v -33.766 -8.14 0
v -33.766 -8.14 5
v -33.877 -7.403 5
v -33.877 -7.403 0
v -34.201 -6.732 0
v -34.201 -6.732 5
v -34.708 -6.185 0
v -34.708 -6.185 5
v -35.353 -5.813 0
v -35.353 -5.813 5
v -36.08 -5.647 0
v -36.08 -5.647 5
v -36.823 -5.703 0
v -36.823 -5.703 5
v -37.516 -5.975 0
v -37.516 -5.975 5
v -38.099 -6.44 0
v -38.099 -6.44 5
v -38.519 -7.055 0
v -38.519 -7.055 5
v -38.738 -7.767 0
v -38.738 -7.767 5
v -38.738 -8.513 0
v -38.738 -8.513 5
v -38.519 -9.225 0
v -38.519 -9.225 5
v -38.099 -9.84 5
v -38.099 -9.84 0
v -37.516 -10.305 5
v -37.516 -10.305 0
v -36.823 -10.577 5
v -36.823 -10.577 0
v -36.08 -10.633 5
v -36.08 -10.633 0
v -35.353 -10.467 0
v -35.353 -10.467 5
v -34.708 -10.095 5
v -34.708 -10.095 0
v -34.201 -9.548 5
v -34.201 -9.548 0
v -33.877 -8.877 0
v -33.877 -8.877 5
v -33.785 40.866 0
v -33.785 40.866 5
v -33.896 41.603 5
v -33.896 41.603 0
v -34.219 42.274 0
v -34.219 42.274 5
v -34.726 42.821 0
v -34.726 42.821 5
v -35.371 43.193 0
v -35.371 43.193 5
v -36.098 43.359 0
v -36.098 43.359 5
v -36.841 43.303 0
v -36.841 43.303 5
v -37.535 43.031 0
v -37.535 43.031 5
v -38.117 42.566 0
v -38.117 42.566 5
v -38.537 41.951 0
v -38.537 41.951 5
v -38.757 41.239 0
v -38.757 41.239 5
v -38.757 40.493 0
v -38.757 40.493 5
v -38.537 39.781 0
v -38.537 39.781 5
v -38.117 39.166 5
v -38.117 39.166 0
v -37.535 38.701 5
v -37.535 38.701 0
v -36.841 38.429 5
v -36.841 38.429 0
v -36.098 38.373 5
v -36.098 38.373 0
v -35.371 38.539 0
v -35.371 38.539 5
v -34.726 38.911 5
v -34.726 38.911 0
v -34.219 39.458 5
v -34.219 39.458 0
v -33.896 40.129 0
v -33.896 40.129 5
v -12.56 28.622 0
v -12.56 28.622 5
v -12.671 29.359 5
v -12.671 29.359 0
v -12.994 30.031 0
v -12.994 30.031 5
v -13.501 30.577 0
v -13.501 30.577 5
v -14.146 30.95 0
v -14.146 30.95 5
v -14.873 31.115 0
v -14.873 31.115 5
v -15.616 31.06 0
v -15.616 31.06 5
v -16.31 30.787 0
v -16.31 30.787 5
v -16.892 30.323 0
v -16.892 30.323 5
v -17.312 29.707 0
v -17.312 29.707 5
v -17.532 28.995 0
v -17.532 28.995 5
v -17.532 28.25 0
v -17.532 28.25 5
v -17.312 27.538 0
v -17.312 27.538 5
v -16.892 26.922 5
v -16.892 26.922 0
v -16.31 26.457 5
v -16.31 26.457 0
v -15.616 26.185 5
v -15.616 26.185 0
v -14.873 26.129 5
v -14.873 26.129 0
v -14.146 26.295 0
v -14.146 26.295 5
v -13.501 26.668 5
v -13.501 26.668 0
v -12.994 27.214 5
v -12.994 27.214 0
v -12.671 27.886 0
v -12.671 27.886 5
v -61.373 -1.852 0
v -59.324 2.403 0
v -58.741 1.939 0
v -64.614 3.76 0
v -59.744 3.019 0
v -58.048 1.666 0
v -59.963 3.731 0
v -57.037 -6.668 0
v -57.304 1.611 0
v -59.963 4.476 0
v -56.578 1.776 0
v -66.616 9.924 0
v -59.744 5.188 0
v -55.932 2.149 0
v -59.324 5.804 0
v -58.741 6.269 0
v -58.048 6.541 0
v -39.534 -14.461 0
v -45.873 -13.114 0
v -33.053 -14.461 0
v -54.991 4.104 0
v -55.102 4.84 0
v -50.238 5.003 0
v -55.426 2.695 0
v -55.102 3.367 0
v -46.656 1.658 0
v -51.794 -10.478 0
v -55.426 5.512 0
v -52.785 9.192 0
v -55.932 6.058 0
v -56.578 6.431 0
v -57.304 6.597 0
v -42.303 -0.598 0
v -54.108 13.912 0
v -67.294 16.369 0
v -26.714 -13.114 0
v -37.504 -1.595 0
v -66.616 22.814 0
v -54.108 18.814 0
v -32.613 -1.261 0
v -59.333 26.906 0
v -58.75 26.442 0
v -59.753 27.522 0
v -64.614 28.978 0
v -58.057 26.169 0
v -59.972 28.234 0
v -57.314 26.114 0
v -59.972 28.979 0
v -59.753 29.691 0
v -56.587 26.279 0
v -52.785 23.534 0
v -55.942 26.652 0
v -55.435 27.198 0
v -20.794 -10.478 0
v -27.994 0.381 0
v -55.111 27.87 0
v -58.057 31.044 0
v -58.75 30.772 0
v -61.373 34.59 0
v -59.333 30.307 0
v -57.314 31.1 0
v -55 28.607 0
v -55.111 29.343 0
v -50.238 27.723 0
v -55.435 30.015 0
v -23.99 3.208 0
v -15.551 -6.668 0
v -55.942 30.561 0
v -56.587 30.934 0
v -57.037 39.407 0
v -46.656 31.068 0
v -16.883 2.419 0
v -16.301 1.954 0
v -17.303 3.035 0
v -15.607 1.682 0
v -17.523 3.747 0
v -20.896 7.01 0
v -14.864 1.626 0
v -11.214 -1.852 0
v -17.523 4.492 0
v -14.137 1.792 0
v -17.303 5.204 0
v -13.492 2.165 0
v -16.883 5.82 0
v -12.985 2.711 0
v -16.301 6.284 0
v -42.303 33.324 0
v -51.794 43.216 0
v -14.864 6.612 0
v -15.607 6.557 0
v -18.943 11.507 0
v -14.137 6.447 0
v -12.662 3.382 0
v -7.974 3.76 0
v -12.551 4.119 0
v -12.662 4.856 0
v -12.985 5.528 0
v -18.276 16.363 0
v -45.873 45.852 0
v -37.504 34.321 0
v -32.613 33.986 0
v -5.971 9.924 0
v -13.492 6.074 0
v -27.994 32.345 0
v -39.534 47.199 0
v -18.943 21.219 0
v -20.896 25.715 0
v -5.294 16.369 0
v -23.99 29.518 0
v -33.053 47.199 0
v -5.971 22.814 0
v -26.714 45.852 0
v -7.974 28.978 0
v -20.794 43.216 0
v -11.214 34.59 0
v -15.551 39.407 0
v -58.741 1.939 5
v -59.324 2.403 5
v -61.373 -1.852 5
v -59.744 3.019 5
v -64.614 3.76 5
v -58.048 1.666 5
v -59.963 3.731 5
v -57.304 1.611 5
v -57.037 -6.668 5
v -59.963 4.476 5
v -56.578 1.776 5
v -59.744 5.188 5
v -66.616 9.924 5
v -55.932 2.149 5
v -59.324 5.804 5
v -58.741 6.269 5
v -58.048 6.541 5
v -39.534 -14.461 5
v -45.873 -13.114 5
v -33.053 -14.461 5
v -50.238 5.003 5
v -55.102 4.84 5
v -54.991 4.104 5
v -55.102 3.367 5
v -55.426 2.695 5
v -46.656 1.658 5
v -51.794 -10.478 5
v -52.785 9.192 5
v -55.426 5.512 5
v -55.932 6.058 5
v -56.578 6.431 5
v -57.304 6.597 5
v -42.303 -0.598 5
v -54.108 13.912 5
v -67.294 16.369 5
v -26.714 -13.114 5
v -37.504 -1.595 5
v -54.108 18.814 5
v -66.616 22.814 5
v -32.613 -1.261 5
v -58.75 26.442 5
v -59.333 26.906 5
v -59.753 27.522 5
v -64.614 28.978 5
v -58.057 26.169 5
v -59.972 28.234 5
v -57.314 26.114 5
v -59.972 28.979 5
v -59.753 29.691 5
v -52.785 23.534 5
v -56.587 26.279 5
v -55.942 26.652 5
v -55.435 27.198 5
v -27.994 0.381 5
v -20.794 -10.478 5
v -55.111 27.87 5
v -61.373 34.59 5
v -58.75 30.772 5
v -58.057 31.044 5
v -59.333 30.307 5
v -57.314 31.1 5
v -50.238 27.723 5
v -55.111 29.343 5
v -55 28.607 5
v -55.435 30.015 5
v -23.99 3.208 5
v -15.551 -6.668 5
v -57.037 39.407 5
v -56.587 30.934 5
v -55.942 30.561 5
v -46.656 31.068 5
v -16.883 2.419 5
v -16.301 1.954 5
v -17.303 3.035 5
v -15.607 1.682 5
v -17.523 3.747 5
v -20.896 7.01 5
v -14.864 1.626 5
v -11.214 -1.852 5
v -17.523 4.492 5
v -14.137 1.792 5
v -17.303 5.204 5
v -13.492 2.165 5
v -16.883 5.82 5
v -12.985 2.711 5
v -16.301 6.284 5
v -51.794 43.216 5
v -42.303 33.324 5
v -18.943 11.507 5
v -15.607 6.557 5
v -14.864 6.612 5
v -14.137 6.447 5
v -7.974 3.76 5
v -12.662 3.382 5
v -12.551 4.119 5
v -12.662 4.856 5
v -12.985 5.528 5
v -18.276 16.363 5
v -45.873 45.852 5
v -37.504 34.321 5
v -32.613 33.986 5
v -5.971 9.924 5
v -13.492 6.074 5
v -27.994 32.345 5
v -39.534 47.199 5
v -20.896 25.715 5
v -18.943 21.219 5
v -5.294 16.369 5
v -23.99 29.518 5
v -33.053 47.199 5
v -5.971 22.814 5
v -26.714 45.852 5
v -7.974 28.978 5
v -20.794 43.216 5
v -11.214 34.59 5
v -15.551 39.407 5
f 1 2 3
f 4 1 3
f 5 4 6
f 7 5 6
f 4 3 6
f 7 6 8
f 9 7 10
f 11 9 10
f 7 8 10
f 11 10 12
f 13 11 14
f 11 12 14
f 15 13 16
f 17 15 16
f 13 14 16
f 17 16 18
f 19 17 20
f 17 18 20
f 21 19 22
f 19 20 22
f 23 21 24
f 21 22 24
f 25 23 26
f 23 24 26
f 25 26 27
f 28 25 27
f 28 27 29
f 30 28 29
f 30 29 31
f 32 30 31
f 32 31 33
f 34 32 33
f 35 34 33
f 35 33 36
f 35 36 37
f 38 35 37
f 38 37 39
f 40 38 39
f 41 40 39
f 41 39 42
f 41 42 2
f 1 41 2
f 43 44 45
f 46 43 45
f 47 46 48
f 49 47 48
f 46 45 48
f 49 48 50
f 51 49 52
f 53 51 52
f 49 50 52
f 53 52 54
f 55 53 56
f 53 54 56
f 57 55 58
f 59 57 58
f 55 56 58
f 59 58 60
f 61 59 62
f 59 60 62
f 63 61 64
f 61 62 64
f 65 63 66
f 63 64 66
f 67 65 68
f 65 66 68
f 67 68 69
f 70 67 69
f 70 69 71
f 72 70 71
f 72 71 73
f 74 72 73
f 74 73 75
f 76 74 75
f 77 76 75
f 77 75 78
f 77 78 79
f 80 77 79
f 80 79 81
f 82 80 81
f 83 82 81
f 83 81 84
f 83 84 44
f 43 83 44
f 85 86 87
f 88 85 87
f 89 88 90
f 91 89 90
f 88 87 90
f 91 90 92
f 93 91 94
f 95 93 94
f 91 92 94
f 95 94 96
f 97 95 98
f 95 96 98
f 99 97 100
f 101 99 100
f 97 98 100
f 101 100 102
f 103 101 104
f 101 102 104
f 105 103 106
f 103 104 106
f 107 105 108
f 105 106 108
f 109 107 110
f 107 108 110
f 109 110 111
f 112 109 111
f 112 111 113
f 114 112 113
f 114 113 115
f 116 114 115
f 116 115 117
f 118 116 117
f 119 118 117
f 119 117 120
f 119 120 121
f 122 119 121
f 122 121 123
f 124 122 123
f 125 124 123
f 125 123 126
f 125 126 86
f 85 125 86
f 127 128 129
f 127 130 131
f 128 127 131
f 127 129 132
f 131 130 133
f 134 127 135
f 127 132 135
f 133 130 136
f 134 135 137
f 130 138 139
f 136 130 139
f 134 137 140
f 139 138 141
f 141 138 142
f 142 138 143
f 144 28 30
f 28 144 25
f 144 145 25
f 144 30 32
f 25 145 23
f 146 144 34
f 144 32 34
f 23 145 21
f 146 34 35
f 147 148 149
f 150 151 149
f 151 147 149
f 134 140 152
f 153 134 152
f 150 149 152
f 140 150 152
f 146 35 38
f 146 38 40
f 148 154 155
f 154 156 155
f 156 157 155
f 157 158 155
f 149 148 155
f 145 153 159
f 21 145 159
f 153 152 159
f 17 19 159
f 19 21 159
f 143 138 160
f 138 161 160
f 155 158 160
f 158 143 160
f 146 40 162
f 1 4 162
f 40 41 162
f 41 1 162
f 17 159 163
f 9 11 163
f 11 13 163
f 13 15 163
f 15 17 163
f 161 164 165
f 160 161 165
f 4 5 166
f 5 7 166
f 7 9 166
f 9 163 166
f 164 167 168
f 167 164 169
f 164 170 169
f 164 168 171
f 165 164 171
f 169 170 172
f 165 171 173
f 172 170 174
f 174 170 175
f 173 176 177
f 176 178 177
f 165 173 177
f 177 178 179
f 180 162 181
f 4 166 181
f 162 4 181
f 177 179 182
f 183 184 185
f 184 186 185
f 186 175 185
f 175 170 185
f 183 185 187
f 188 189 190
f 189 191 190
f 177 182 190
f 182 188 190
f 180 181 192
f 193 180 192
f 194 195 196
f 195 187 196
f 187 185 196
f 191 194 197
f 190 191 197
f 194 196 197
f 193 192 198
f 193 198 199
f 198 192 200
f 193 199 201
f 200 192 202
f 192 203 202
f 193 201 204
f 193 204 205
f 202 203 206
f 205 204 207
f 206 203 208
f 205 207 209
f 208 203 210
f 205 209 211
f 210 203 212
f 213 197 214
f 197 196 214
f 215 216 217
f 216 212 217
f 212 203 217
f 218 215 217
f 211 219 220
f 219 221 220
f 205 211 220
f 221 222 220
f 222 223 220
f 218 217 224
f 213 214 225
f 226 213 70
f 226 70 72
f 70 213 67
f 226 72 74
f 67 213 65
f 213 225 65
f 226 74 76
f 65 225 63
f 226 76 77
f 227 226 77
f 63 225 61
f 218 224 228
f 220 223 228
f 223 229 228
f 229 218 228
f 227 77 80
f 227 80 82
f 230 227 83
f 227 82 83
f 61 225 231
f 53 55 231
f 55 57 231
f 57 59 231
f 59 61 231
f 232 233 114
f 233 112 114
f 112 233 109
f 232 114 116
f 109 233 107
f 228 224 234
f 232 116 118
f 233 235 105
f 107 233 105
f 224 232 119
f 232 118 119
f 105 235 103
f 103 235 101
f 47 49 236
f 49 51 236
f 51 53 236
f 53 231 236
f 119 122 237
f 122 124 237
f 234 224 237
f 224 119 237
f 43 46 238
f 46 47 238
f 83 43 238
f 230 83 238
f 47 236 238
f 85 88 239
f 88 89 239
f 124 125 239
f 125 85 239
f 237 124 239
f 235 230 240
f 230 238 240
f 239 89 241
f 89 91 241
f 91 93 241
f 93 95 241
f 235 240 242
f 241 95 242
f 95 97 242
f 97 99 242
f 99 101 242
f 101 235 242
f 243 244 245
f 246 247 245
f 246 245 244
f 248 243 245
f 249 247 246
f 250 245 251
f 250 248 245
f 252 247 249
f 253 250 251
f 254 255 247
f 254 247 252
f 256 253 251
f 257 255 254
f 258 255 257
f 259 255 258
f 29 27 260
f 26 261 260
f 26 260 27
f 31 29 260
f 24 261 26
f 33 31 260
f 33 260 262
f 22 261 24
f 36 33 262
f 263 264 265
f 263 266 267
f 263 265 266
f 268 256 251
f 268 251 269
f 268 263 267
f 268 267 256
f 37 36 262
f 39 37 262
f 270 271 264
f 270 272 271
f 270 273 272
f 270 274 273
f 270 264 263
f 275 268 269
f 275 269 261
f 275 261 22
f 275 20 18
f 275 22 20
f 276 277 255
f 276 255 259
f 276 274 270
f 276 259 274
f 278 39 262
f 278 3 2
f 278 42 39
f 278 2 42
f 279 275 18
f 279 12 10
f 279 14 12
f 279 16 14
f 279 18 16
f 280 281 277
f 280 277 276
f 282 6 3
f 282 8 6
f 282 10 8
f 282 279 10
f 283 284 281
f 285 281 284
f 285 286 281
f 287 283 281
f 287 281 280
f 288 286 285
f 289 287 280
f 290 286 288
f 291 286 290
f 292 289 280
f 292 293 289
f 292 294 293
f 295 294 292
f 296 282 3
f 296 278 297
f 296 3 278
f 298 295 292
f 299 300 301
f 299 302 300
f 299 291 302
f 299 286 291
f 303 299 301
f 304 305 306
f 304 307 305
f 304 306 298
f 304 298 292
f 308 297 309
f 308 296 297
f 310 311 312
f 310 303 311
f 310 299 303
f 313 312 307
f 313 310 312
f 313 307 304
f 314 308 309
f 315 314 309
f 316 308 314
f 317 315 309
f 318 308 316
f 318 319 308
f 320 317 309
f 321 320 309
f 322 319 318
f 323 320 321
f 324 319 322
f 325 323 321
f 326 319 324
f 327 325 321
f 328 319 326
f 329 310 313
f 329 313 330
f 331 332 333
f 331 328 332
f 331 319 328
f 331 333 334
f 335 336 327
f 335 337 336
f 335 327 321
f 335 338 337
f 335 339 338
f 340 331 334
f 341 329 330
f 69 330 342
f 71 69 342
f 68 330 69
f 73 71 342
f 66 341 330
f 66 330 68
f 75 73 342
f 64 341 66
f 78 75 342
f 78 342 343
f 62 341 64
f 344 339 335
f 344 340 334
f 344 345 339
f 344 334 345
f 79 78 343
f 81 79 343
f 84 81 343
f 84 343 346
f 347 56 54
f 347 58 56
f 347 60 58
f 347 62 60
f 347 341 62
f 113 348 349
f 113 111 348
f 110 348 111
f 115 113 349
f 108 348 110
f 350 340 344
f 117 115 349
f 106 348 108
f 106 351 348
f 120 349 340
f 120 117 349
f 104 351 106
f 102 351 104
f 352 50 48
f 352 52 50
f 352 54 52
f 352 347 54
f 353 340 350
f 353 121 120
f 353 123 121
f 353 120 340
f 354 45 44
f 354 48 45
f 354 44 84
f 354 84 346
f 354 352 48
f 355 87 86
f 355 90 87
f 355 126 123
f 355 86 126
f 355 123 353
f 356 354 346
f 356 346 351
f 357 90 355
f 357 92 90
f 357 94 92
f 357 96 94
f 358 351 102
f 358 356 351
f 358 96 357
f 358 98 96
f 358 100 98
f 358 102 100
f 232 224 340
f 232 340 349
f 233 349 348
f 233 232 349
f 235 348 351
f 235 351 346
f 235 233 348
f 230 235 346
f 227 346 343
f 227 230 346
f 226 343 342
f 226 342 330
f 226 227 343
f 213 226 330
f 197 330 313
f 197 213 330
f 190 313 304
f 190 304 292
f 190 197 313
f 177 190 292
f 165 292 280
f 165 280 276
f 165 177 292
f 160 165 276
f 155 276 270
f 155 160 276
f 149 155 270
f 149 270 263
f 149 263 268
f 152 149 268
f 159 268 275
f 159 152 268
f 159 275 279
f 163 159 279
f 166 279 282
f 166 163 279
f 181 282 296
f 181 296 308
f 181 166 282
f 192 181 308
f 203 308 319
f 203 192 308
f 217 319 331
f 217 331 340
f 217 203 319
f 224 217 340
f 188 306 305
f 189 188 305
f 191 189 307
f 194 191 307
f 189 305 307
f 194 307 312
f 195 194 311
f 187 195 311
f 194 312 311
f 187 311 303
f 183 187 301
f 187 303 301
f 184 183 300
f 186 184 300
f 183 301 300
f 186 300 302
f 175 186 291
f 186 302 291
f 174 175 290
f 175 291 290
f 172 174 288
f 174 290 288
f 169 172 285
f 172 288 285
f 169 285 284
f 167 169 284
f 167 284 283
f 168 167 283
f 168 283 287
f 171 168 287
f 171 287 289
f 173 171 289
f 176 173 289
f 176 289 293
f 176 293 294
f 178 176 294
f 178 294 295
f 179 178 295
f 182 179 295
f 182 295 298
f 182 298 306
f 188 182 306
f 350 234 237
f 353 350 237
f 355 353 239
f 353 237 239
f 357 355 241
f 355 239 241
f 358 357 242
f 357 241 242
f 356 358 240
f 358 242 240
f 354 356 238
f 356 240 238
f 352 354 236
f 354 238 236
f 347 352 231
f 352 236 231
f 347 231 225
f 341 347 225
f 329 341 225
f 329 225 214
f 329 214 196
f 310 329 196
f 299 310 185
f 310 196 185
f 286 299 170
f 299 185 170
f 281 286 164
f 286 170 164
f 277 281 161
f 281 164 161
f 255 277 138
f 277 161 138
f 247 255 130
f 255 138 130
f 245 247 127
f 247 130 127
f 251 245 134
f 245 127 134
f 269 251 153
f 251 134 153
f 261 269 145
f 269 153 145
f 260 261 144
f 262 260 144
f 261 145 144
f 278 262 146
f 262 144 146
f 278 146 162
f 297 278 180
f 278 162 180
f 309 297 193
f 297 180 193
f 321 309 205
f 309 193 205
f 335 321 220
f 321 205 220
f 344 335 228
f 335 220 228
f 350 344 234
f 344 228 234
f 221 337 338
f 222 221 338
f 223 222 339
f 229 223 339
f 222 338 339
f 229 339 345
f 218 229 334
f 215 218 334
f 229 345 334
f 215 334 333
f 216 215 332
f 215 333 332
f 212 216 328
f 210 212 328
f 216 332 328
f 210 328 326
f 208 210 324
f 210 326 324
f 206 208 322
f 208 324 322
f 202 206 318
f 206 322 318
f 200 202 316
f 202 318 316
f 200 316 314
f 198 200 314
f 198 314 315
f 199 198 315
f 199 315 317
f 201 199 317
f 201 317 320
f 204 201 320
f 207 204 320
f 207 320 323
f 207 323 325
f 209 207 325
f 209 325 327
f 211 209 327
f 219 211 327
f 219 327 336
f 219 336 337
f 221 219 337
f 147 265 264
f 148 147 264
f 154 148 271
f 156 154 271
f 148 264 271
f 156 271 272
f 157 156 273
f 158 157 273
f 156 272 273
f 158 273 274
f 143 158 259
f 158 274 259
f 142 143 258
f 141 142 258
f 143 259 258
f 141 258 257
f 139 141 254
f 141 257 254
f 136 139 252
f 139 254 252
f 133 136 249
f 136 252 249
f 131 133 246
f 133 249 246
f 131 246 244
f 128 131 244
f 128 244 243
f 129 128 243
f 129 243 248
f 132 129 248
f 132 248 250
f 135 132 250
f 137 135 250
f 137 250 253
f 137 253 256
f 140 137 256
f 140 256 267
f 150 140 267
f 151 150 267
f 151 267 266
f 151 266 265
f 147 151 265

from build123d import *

# Parameters (mm, degrees)
SKETCH1_R           = 31
SKETCH1_R_2         = 18
BOSS_EXTRUDE1_DEPTH = 5
SKETCH2_R           = 2.5
CUT_EXTRUDE1_DEPTH  = 83.445600309


with BuildPart() as part:
    # Sketch1 → Boss-Extrude1 (new body)
    with BuildSketch(Plane.XY):
        with Locations((-36.293764936, 16.369042749)):
            Circle(SKETCH1_R)
        with Locations((-36.275518266, 16.362982128)):
            Circle(SKETCH1_R_2, mode=Mode.SUBTRACT)
    extrude(amount=BOSS_EXTRUDE1_DEPTH)

    # Sketch2 → Cut-Extrude1 (cut, through all)
    with BuildSketch(Plane.XY.offset(5)):
        with Locations((-36.284641601, 40.866012439)):
            Circle(SKETCH2_R)
        with Locations((-15.059833215, 28.622398324)):
            Circle(SKETCH2_R)
        with Locations((-15.050709879, 4.119368013)):
            Circle(SKETCH2_R)
        with Locations((-36.26639493, -8.140048182)):
            Circle(SKETCH2_R)
        with Locations((-57.491203317, 4.103565933)):
            Circle(SKETCH2_R)
        with Locations((-57.500326652, 28.606596243)):
            Circle(SKETCH2_R)
    extrude(amount=-CUT_EXTRUDE1_DEPTH, mode=Mode.SUBTRACT)


solid = part.part
